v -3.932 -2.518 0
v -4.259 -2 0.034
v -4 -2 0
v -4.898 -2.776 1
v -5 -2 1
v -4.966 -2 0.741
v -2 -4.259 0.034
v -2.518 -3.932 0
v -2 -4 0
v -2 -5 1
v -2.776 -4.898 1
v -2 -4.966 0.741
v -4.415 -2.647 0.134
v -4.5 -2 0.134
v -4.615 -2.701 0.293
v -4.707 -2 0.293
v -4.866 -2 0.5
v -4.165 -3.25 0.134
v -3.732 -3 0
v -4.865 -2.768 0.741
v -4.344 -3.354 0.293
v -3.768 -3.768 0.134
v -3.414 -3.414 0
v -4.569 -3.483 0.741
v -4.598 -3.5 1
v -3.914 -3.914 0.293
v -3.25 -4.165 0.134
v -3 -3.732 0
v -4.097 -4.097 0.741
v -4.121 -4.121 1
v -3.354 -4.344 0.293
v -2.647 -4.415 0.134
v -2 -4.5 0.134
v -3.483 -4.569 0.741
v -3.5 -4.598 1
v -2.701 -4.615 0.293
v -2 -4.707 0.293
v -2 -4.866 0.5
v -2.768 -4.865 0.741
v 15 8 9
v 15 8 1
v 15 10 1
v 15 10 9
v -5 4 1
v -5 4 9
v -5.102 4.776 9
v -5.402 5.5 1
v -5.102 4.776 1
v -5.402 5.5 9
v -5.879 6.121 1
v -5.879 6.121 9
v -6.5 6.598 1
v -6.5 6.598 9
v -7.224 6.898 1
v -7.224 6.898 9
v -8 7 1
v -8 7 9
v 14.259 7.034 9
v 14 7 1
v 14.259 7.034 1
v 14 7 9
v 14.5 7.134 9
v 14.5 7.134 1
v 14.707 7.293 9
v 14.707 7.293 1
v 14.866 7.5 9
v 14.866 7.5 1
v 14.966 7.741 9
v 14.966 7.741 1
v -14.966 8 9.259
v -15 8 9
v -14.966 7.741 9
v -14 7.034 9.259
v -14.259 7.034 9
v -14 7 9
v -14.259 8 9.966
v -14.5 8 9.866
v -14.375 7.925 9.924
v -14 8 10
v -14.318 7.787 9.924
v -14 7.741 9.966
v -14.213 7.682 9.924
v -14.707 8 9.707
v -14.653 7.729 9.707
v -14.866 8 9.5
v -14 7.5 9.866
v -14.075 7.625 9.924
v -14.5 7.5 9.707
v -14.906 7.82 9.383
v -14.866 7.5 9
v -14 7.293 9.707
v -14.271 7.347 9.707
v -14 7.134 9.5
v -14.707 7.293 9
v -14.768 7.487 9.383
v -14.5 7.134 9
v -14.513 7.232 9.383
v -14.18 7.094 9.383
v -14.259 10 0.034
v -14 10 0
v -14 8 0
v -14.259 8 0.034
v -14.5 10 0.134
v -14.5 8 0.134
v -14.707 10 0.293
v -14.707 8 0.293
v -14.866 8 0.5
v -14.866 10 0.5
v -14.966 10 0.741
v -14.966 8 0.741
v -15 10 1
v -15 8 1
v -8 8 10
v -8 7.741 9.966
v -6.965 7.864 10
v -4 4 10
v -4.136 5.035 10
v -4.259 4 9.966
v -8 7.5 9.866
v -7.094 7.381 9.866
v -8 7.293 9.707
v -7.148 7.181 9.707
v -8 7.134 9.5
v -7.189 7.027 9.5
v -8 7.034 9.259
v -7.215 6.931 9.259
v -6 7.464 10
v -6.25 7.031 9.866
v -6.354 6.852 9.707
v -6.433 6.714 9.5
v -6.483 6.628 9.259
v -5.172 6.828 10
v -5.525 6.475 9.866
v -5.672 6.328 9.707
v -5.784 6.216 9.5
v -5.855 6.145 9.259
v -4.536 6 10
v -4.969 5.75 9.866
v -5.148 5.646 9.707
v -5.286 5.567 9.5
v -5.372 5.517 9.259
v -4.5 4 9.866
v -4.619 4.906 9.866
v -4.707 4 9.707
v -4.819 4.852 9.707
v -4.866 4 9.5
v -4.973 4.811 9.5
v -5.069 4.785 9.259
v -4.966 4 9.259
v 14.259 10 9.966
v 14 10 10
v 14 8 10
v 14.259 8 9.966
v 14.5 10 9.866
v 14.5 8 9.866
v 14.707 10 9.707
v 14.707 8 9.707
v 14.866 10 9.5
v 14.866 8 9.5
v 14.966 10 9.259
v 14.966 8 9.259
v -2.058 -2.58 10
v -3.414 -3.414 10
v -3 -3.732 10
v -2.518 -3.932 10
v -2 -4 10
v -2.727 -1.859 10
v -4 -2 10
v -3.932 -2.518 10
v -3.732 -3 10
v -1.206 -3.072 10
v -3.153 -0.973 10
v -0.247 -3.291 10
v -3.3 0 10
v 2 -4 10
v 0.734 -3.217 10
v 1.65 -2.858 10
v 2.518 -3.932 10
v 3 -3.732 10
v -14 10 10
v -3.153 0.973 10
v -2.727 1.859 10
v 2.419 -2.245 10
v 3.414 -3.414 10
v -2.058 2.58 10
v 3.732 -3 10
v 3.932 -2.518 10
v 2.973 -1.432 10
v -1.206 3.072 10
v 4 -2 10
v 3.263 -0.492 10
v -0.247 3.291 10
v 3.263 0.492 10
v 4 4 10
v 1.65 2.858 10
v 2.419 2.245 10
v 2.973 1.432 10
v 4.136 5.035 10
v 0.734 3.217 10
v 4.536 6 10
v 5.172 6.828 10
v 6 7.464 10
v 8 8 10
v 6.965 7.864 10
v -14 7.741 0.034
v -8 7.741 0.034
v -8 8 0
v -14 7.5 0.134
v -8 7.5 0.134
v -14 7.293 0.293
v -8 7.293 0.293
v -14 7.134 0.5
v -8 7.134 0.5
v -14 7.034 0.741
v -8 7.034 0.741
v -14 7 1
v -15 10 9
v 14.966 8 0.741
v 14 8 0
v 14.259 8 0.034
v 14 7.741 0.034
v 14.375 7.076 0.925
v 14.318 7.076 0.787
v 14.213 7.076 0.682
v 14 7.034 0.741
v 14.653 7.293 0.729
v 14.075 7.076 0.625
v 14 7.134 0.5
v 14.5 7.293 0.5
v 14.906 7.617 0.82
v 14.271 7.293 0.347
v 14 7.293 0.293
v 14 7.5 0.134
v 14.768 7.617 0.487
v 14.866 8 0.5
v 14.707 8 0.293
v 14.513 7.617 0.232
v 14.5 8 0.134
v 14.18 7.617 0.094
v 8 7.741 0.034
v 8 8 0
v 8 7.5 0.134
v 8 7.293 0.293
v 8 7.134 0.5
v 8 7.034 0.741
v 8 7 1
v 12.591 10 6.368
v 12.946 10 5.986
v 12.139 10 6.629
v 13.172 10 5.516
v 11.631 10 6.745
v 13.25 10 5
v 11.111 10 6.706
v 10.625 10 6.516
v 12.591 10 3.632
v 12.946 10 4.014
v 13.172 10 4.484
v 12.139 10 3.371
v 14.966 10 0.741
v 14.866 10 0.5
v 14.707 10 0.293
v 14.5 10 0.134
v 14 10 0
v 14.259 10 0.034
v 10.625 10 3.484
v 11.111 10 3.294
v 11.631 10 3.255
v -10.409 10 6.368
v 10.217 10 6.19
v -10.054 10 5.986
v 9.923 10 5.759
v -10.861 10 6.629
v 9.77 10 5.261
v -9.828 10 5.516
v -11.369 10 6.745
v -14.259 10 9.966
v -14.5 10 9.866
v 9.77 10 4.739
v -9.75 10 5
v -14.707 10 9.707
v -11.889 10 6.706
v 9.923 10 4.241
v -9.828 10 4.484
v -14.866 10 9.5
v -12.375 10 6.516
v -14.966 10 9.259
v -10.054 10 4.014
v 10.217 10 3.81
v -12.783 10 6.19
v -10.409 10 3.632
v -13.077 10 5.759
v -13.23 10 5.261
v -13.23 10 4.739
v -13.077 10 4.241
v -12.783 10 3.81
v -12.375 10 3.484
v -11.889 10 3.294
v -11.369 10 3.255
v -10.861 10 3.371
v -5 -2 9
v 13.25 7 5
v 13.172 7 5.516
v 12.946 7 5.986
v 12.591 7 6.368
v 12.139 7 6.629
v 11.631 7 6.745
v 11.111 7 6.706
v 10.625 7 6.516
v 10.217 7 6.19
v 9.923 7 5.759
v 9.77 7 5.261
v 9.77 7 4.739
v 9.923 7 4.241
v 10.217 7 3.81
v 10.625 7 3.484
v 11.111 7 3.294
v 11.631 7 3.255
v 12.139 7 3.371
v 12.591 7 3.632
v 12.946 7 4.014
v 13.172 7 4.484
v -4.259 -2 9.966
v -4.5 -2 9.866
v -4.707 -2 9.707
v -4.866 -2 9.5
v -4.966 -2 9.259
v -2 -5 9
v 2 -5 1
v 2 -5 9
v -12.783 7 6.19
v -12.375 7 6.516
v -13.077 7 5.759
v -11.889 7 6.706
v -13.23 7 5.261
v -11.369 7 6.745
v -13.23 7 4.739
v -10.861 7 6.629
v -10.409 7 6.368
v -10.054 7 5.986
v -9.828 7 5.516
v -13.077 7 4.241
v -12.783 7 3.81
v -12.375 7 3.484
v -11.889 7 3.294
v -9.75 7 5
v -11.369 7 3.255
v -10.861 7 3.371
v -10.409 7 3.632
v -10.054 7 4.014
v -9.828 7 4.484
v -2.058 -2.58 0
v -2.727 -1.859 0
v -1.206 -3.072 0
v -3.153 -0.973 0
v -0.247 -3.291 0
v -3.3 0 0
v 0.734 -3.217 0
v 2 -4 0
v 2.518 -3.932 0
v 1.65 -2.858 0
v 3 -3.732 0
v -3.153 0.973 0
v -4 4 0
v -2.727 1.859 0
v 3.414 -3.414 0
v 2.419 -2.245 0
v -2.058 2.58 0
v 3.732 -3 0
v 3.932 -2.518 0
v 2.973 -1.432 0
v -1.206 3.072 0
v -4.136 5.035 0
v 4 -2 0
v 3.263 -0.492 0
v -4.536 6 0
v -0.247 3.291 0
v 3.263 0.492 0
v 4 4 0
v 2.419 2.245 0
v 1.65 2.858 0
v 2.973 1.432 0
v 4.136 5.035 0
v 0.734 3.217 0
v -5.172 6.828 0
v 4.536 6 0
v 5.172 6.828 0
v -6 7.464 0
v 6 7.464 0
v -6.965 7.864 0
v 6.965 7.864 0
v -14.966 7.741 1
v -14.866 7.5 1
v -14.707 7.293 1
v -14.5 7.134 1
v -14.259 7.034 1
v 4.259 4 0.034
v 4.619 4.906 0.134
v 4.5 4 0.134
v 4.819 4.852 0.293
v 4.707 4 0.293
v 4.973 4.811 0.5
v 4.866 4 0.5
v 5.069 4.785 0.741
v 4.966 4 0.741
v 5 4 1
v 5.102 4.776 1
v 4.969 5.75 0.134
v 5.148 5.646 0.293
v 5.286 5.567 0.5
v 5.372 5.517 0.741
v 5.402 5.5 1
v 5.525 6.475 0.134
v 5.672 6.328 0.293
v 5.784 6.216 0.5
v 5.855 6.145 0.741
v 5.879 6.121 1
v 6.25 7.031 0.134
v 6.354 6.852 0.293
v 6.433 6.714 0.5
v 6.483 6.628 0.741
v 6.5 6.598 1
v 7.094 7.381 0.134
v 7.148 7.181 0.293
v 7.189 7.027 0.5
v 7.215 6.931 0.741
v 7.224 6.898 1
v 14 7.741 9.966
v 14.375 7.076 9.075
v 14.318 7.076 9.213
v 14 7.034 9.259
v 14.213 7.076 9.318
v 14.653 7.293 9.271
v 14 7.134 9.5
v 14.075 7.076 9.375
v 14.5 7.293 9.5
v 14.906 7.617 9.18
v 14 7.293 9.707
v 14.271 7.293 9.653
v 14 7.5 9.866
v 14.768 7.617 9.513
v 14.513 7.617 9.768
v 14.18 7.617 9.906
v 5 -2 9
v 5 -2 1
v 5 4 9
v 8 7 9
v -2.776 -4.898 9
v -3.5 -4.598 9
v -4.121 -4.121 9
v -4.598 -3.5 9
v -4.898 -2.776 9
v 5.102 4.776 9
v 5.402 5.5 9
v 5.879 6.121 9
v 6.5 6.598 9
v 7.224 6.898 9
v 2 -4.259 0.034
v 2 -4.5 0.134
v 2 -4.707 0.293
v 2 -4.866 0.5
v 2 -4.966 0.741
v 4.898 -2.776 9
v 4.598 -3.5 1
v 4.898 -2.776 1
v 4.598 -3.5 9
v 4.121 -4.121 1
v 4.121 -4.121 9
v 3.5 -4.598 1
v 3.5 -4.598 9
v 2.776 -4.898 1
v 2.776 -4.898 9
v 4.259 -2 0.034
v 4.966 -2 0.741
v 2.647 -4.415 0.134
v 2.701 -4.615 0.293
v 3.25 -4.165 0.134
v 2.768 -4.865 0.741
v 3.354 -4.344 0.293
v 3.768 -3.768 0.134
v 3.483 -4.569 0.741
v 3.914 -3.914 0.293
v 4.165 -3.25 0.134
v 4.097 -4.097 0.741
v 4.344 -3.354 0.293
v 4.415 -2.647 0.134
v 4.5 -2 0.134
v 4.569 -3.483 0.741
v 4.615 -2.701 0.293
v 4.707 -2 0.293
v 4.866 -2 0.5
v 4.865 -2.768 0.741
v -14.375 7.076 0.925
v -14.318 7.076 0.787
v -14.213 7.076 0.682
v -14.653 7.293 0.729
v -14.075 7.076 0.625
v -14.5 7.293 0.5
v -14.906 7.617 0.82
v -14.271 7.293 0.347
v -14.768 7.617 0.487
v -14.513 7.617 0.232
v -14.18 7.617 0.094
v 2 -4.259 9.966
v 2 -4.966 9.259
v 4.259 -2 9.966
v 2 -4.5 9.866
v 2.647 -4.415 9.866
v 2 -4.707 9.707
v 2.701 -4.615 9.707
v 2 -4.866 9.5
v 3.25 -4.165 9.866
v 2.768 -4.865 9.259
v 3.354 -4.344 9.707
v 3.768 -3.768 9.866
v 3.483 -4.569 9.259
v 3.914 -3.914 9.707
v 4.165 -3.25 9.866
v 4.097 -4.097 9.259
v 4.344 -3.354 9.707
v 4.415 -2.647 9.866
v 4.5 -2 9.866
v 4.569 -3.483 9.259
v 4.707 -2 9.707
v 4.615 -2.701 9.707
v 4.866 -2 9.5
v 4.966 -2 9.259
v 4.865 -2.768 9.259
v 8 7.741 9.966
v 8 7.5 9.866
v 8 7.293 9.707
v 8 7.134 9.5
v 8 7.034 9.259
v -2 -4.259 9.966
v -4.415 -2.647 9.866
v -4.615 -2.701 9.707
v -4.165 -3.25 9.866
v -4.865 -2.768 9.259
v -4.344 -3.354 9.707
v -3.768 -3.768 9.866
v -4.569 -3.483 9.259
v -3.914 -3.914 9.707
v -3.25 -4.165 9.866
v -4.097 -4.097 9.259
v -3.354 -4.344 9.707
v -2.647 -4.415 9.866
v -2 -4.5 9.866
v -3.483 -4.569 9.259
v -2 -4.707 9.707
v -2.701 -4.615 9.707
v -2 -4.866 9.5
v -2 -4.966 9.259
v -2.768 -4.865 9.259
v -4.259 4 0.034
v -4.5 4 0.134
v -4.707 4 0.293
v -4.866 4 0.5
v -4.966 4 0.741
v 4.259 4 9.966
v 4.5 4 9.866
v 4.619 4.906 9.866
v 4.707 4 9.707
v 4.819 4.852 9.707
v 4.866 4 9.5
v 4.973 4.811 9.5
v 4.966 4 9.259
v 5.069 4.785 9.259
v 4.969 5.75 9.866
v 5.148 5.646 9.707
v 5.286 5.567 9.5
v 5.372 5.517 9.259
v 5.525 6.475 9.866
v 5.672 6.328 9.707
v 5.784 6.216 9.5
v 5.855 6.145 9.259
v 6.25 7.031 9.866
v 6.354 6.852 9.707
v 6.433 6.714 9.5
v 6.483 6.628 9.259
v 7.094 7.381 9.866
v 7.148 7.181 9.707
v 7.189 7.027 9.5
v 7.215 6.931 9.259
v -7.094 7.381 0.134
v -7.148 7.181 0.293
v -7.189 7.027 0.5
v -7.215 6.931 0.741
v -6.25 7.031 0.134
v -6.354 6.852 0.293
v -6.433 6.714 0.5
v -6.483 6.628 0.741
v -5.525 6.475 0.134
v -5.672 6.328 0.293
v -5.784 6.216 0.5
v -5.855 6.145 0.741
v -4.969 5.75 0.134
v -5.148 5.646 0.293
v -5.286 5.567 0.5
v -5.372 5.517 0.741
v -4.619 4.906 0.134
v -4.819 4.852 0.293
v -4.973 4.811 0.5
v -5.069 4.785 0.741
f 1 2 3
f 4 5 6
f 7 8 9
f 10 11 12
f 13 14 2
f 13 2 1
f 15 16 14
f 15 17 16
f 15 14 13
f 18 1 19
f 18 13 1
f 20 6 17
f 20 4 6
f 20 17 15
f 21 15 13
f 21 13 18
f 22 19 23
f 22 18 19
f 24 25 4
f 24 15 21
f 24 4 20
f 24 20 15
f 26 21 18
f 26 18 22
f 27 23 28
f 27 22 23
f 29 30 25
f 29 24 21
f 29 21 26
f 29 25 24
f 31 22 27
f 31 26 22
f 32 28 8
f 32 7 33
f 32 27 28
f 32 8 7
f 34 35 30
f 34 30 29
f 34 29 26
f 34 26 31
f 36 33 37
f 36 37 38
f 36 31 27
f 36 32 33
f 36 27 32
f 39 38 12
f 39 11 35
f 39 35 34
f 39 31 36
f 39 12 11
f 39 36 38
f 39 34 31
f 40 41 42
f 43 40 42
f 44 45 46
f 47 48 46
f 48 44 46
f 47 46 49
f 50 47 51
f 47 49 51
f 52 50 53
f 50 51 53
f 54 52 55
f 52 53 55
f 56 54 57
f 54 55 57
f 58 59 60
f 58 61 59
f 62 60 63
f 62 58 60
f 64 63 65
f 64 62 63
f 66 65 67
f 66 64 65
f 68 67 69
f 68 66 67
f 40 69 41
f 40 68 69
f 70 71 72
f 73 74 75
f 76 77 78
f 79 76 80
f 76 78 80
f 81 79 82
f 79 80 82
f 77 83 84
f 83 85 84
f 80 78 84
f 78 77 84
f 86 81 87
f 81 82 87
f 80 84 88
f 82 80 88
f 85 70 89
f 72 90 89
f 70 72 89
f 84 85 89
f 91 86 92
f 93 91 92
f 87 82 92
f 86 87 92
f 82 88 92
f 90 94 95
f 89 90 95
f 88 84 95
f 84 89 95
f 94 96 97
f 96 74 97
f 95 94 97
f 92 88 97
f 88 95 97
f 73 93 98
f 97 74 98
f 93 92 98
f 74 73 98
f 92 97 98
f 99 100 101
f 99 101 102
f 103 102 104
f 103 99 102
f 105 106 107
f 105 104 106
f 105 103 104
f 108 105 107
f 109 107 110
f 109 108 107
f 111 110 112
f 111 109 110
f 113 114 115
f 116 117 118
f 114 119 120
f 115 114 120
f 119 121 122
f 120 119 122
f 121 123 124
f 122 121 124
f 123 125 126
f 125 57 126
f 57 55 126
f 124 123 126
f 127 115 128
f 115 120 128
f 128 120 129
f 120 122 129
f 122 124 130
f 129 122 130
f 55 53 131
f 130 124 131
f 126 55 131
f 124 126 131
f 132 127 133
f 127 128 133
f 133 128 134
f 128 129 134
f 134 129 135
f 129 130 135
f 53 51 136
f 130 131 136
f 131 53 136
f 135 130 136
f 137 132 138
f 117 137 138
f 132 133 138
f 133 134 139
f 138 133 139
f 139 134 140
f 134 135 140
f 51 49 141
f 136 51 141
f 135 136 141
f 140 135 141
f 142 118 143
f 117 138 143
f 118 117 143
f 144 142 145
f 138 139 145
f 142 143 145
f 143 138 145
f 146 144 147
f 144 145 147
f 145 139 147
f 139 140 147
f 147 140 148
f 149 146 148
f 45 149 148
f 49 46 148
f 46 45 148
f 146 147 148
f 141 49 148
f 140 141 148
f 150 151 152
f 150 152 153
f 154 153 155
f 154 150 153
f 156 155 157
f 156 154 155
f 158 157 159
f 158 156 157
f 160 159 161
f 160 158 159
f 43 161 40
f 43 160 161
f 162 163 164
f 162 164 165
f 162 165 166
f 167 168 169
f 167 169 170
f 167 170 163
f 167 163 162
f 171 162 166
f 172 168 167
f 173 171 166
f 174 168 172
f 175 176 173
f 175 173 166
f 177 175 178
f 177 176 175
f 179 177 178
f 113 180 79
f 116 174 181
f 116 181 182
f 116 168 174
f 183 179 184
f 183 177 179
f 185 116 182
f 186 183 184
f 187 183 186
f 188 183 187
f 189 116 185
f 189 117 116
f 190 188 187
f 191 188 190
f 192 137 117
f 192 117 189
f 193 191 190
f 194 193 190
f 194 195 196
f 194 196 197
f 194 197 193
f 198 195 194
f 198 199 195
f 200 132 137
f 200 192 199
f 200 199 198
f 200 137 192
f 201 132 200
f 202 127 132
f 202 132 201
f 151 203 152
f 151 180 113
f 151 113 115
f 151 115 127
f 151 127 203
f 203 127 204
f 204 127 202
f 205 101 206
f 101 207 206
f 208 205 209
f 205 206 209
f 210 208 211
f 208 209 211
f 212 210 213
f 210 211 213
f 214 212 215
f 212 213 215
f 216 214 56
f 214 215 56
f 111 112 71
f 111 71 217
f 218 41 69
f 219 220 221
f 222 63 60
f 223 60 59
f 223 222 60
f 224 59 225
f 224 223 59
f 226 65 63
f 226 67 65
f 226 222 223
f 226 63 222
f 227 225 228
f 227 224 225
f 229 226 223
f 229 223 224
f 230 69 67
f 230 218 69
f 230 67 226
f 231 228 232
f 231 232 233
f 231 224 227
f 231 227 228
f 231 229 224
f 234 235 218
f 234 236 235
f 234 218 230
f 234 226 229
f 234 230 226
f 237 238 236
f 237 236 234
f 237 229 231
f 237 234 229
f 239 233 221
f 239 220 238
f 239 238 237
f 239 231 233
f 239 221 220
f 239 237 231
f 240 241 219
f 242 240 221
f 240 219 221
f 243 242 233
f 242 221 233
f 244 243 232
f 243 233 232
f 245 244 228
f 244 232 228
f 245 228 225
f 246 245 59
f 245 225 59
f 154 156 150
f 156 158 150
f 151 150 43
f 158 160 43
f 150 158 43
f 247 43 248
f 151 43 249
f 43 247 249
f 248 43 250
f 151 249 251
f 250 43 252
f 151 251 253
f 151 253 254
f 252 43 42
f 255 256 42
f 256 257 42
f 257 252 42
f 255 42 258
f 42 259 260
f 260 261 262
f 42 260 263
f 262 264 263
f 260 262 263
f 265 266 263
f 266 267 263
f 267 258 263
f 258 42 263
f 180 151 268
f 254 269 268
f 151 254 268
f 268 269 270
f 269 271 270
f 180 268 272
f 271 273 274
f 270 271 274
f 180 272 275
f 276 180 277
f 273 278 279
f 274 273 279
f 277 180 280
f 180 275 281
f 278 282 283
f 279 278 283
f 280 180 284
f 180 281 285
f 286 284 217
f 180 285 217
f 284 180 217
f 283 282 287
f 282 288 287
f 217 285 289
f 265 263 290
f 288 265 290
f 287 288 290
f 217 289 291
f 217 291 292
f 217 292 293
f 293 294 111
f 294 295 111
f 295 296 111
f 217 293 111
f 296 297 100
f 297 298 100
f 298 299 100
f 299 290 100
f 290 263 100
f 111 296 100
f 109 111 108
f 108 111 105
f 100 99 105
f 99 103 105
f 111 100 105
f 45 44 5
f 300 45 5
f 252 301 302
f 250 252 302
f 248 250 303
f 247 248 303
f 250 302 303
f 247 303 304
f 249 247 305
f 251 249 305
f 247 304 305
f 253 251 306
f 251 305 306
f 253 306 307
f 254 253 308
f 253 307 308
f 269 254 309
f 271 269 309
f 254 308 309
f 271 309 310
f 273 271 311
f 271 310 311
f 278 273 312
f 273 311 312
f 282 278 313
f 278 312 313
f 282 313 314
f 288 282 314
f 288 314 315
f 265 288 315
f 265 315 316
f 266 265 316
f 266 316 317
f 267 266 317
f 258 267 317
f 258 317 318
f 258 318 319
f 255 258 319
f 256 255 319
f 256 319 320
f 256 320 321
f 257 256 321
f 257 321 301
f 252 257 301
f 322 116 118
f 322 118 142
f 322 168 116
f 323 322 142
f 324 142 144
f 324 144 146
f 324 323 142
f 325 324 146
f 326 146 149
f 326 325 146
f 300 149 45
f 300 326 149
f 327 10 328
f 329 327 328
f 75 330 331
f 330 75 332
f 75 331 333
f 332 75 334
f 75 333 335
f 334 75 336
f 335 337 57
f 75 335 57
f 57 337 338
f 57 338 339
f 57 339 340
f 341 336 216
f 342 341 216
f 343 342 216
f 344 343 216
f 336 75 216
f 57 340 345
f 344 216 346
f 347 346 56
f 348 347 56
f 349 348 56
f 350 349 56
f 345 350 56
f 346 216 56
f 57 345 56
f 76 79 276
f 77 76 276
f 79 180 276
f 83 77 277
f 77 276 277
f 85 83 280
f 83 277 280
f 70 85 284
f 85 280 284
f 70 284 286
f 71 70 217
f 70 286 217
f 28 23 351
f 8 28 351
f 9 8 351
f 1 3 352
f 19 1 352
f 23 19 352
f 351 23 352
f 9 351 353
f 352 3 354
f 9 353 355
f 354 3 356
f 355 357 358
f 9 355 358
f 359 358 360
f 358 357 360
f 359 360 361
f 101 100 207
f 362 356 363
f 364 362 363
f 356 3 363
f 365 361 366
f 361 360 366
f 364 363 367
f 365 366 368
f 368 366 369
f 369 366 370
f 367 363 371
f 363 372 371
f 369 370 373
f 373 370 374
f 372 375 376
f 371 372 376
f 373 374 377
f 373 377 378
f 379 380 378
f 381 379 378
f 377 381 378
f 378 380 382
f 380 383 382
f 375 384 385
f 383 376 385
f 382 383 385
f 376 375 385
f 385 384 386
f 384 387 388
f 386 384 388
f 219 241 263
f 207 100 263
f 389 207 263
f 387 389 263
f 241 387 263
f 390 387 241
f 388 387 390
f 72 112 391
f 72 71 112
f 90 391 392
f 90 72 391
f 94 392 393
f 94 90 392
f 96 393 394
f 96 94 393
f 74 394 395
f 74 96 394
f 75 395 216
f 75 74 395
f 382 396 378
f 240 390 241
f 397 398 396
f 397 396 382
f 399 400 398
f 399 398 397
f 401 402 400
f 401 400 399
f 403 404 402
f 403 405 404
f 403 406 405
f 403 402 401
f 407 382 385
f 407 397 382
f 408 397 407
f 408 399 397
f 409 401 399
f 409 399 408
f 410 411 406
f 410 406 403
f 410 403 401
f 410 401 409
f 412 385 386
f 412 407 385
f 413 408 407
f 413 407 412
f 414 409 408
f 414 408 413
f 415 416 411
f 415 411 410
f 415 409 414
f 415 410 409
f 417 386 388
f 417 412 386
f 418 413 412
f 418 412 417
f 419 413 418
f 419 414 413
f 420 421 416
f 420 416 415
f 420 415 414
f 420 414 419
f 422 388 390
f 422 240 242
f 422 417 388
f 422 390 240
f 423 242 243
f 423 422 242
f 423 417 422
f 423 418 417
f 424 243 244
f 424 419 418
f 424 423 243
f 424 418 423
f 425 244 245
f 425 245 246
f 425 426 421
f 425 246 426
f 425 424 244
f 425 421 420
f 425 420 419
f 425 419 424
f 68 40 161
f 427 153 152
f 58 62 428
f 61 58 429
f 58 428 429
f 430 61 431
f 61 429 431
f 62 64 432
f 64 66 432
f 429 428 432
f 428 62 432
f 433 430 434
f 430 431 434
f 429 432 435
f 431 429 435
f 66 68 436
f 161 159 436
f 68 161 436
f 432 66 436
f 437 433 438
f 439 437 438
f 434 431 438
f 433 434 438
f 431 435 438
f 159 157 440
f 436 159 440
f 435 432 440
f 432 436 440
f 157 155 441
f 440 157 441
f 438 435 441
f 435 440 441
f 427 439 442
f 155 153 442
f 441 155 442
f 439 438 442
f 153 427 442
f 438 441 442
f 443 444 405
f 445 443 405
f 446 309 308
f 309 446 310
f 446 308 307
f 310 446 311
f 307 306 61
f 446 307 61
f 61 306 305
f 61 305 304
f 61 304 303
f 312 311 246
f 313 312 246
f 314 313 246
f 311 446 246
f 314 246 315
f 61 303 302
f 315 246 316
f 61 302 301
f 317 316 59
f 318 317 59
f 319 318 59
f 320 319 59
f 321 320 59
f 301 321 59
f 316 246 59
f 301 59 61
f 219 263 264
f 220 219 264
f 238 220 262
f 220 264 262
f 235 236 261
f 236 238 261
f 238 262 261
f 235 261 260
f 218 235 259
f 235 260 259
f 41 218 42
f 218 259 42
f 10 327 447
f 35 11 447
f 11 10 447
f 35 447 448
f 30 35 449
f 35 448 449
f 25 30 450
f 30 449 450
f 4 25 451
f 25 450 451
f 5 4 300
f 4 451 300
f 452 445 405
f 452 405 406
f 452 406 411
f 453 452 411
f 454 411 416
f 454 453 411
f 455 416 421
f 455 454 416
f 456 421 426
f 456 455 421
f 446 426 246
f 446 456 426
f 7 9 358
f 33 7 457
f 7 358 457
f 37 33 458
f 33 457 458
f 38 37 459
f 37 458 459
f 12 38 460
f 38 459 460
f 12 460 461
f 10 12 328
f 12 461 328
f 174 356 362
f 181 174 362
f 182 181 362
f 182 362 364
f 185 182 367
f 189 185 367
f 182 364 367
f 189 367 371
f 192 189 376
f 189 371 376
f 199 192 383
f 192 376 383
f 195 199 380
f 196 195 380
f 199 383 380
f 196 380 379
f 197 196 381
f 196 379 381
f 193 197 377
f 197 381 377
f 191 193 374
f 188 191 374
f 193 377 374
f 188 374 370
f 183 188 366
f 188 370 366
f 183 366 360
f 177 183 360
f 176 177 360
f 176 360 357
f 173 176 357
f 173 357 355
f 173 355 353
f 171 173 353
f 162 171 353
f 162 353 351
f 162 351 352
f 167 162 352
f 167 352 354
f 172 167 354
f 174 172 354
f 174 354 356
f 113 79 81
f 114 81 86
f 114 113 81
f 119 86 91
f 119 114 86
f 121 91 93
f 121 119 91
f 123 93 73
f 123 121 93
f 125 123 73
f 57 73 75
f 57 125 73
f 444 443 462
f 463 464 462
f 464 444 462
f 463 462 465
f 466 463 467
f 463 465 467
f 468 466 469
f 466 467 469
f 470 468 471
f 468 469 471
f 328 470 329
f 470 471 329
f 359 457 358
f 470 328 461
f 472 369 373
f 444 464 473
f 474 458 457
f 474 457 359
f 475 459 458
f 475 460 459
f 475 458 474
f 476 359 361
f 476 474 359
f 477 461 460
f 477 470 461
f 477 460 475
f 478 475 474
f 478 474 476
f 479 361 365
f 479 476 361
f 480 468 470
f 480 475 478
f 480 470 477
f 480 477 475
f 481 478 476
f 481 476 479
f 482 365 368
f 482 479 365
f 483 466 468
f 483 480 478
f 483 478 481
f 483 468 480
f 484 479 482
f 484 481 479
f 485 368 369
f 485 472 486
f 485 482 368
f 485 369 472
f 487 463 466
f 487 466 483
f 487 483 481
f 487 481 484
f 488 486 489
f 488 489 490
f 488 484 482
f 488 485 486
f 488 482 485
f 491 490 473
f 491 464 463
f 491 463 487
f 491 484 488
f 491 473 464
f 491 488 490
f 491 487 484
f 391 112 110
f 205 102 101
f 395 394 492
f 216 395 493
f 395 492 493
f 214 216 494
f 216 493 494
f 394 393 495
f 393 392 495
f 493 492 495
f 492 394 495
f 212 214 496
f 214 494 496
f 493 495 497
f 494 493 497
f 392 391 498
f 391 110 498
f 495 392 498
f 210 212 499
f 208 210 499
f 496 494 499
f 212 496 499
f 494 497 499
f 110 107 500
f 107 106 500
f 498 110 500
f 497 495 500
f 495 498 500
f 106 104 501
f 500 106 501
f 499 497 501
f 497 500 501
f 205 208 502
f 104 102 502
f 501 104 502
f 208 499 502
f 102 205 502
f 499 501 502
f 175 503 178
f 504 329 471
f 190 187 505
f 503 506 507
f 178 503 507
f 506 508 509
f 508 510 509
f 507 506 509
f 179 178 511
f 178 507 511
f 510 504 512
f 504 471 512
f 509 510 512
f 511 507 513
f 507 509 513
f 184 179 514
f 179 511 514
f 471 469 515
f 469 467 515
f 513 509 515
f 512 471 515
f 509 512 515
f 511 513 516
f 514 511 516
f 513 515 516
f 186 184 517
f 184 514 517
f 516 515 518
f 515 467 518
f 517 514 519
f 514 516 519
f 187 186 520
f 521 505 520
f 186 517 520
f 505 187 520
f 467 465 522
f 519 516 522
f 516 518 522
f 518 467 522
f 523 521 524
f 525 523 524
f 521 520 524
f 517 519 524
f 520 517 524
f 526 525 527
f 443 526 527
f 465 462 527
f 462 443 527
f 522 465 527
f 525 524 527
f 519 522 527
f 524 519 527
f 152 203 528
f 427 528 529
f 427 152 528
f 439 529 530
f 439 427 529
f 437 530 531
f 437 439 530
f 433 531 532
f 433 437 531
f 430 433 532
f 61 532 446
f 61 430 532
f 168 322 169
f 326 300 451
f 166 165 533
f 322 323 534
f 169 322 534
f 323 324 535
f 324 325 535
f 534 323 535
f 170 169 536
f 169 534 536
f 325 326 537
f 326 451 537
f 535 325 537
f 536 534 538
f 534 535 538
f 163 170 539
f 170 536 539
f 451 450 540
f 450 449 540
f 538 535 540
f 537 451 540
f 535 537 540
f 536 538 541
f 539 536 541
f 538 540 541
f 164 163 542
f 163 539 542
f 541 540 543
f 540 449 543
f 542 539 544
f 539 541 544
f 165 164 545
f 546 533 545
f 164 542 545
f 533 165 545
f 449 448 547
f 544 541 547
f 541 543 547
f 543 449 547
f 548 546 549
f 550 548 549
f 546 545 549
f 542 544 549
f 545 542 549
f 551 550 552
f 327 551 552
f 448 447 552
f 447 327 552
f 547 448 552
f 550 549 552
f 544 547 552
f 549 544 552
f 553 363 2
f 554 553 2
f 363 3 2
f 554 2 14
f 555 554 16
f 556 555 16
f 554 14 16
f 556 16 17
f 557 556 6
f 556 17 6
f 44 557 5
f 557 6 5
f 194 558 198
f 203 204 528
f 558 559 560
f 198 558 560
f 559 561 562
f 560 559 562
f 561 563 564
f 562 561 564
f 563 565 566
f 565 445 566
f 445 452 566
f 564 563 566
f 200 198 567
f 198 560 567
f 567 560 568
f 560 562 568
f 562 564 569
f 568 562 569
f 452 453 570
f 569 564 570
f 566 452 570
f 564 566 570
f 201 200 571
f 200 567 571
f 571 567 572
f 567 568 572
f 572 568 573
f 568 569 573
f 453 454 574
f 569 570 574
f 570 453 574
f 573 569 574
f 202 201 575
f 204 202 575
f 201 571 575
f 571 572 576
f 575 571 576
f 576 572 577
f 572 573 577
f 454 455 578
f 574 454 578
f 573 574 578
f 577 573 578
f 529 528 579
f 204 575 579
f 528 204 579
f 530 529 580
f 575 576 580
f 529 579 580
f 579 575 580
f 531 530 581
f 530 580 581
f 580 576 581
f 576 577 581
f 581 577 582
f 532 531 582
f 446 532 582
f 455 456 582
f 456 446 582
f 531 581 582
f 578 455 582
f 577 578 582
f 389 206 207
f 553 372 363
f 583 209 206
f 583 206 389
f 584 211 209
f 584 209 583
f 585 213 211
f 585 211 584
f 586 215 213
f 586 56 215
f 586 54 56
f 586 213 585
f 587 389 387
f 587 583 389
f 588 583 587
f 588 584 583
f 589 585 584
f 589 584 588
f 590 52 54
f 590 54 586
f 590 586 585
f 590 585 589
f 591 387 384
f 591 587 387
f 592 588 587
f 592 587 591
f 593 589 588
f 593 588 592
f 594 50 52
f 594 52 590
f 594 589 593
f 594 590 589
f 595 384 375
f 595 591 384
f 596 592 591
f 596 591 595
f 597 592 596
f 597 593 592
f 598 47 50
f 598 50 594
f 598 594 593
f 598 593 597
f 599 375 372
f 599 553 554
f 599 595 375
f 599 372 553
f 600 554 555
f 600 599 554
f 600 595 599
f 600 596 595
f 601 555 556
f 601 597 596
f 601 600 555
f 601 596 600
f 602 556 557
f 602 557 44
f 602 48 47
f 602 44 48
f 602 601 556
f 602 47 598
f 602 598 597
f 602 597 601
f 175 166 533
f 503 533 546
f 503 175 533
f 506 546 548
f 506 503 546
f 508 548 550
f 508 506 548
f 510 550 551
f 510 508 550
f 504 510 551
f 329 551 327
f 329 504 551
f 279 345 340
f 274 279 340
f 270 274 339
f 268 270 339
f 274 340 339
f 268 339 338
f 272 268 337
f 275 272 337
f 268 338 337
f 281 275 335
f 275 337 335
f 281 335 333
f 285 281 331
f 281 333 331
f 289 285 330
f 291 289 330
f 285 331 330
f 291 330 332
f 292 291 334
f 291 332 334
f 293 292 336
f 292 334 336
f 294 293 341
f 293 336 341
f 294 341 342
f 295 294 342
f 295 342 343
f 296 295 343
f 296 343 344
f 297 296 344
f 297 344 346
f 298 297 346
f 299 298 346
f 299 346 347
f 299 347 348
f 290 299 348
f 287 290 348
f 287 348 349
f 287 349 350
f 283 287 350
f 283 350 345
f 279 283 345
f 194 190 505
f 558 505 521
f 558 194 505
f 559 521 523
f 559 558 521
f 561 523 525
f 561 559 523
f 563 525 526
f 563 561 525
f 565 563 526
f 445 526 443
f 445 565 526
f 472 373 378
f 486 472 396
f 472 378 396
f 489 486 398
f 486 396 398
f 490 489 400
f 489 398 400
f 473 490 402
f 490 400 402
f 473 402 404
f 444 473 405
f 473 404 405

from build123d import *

# Parameters (mm, degrees)
SKETCH_1_W          = 10
SKETCH_1_H          = 3
EXTRUDE_1_DEPTH     = 10
SKETCH_2_R          = 3.3
CUT_EXTRUDE_1_DEPTH = 11
SKETCH_3_R          = 1.75
CUT_EXTRUDE_2_DEPTH = 4
FILLET_1_R          = 3
FILLET_2_R          = 1


with BuildPart() as part:
    # ｽｹｯﾁ1 → ﾎﾞｽ - 押し出し1 (new body)
    with BuildSketch(Plane.XY):
        Polygon((5, 10), (0, 10), (0, -5), (5, -5), (5, 7), align=None)
        with Locations((10, 8.5)):
            Rectangle(SKETCH_1_W, SKETCH_1_H)
        Polygon((0, -5), (0, 10), (-5, 10), (-5, 7), (-5, -5), align=None)
        with Locations((-10, 8.5)):
            Rectangle(SKETCH_1_W, SKETCH_1_H)
    extrude(amount=EXTRUDE_1_DEPTH)

    # ｽｹｯﾁ2 → ｶｯﾄ - 押し出し1 (cut, through all)
    with BuildSketch(Plane(origin=(0, 0, 0), x_dir=(-1, 0, 0), z_dir=(0, 0, -1))):
        Circle(SKETCH_2_R)
    extrude(amount=-CUT_EXTRUDE_1_DEPTH, mode=Mode.SUBTRACT)

    # ｽｹｯﾁ3 → ｶｯﾄ - 押し出し2 (cut, through all)
    with BuildSketch(Plane.XZ.offset(-7)):
        with Locations((-11.5, 5)):
            Circle(SKETCH_3_R)
        with Locations((11.5, 5)):
            Circle(SKETCH_3_R)
    extrude(amount=-CUT_EXTRUDE_2_DEPTH, mode=Mode.SUBTRACT)

    # ﾌｨﾚｯﾄ1
    fillet_1_edges = [part.edges().sort_by_distance(p)[0] for p in [
        (5, -5, 5),
        (-5, -5, 5),
        (-5, 7, 5),
        (5, 7, 5),
    ]]
    fillet(fillet_1_edges, radius=FILLET_1_R)

    # ﾌｨﾚｯﾄ2
    fillet_2_edges = [part.edges().sort_by_distance(p)[0] for p in [
        (-15, 8.5, 0),
        (15, 8.5, 0),
        (15, 8.5, 10),
        (-15, 7, 5),
        (15, 7, 5),
        (-15, 8.5, 10),
        (-5, 1, 0),
        (-5, 1, 10),
        (-11.5, 7, 0),
        (-11.5, 7, 10),
        (11.5, 7, 0),
        (11.5, 7, 10),
        (5, 1, 0),
        (5, 1, 10),
        (0, -5, 0),
        (0, -5, 10),
        (4.121320344, -4.121320344, 0),
        (-4.121320344, -4.121320344, 0),
        (4.121320344, -4.121320344, 10),
        (-4.121320344, -4.121320344, 10),
        (-5.878679656, 6.121320344, 0),
        (-5.878679656, 6.121320344, 10),
        (5.878679656, 6.121320344, 0),
        (5.878679656, 6.121320344, 10),
    ]]
    fillet(fillet_2_edges, radius=FILLET_2_R)


solid = part.part
